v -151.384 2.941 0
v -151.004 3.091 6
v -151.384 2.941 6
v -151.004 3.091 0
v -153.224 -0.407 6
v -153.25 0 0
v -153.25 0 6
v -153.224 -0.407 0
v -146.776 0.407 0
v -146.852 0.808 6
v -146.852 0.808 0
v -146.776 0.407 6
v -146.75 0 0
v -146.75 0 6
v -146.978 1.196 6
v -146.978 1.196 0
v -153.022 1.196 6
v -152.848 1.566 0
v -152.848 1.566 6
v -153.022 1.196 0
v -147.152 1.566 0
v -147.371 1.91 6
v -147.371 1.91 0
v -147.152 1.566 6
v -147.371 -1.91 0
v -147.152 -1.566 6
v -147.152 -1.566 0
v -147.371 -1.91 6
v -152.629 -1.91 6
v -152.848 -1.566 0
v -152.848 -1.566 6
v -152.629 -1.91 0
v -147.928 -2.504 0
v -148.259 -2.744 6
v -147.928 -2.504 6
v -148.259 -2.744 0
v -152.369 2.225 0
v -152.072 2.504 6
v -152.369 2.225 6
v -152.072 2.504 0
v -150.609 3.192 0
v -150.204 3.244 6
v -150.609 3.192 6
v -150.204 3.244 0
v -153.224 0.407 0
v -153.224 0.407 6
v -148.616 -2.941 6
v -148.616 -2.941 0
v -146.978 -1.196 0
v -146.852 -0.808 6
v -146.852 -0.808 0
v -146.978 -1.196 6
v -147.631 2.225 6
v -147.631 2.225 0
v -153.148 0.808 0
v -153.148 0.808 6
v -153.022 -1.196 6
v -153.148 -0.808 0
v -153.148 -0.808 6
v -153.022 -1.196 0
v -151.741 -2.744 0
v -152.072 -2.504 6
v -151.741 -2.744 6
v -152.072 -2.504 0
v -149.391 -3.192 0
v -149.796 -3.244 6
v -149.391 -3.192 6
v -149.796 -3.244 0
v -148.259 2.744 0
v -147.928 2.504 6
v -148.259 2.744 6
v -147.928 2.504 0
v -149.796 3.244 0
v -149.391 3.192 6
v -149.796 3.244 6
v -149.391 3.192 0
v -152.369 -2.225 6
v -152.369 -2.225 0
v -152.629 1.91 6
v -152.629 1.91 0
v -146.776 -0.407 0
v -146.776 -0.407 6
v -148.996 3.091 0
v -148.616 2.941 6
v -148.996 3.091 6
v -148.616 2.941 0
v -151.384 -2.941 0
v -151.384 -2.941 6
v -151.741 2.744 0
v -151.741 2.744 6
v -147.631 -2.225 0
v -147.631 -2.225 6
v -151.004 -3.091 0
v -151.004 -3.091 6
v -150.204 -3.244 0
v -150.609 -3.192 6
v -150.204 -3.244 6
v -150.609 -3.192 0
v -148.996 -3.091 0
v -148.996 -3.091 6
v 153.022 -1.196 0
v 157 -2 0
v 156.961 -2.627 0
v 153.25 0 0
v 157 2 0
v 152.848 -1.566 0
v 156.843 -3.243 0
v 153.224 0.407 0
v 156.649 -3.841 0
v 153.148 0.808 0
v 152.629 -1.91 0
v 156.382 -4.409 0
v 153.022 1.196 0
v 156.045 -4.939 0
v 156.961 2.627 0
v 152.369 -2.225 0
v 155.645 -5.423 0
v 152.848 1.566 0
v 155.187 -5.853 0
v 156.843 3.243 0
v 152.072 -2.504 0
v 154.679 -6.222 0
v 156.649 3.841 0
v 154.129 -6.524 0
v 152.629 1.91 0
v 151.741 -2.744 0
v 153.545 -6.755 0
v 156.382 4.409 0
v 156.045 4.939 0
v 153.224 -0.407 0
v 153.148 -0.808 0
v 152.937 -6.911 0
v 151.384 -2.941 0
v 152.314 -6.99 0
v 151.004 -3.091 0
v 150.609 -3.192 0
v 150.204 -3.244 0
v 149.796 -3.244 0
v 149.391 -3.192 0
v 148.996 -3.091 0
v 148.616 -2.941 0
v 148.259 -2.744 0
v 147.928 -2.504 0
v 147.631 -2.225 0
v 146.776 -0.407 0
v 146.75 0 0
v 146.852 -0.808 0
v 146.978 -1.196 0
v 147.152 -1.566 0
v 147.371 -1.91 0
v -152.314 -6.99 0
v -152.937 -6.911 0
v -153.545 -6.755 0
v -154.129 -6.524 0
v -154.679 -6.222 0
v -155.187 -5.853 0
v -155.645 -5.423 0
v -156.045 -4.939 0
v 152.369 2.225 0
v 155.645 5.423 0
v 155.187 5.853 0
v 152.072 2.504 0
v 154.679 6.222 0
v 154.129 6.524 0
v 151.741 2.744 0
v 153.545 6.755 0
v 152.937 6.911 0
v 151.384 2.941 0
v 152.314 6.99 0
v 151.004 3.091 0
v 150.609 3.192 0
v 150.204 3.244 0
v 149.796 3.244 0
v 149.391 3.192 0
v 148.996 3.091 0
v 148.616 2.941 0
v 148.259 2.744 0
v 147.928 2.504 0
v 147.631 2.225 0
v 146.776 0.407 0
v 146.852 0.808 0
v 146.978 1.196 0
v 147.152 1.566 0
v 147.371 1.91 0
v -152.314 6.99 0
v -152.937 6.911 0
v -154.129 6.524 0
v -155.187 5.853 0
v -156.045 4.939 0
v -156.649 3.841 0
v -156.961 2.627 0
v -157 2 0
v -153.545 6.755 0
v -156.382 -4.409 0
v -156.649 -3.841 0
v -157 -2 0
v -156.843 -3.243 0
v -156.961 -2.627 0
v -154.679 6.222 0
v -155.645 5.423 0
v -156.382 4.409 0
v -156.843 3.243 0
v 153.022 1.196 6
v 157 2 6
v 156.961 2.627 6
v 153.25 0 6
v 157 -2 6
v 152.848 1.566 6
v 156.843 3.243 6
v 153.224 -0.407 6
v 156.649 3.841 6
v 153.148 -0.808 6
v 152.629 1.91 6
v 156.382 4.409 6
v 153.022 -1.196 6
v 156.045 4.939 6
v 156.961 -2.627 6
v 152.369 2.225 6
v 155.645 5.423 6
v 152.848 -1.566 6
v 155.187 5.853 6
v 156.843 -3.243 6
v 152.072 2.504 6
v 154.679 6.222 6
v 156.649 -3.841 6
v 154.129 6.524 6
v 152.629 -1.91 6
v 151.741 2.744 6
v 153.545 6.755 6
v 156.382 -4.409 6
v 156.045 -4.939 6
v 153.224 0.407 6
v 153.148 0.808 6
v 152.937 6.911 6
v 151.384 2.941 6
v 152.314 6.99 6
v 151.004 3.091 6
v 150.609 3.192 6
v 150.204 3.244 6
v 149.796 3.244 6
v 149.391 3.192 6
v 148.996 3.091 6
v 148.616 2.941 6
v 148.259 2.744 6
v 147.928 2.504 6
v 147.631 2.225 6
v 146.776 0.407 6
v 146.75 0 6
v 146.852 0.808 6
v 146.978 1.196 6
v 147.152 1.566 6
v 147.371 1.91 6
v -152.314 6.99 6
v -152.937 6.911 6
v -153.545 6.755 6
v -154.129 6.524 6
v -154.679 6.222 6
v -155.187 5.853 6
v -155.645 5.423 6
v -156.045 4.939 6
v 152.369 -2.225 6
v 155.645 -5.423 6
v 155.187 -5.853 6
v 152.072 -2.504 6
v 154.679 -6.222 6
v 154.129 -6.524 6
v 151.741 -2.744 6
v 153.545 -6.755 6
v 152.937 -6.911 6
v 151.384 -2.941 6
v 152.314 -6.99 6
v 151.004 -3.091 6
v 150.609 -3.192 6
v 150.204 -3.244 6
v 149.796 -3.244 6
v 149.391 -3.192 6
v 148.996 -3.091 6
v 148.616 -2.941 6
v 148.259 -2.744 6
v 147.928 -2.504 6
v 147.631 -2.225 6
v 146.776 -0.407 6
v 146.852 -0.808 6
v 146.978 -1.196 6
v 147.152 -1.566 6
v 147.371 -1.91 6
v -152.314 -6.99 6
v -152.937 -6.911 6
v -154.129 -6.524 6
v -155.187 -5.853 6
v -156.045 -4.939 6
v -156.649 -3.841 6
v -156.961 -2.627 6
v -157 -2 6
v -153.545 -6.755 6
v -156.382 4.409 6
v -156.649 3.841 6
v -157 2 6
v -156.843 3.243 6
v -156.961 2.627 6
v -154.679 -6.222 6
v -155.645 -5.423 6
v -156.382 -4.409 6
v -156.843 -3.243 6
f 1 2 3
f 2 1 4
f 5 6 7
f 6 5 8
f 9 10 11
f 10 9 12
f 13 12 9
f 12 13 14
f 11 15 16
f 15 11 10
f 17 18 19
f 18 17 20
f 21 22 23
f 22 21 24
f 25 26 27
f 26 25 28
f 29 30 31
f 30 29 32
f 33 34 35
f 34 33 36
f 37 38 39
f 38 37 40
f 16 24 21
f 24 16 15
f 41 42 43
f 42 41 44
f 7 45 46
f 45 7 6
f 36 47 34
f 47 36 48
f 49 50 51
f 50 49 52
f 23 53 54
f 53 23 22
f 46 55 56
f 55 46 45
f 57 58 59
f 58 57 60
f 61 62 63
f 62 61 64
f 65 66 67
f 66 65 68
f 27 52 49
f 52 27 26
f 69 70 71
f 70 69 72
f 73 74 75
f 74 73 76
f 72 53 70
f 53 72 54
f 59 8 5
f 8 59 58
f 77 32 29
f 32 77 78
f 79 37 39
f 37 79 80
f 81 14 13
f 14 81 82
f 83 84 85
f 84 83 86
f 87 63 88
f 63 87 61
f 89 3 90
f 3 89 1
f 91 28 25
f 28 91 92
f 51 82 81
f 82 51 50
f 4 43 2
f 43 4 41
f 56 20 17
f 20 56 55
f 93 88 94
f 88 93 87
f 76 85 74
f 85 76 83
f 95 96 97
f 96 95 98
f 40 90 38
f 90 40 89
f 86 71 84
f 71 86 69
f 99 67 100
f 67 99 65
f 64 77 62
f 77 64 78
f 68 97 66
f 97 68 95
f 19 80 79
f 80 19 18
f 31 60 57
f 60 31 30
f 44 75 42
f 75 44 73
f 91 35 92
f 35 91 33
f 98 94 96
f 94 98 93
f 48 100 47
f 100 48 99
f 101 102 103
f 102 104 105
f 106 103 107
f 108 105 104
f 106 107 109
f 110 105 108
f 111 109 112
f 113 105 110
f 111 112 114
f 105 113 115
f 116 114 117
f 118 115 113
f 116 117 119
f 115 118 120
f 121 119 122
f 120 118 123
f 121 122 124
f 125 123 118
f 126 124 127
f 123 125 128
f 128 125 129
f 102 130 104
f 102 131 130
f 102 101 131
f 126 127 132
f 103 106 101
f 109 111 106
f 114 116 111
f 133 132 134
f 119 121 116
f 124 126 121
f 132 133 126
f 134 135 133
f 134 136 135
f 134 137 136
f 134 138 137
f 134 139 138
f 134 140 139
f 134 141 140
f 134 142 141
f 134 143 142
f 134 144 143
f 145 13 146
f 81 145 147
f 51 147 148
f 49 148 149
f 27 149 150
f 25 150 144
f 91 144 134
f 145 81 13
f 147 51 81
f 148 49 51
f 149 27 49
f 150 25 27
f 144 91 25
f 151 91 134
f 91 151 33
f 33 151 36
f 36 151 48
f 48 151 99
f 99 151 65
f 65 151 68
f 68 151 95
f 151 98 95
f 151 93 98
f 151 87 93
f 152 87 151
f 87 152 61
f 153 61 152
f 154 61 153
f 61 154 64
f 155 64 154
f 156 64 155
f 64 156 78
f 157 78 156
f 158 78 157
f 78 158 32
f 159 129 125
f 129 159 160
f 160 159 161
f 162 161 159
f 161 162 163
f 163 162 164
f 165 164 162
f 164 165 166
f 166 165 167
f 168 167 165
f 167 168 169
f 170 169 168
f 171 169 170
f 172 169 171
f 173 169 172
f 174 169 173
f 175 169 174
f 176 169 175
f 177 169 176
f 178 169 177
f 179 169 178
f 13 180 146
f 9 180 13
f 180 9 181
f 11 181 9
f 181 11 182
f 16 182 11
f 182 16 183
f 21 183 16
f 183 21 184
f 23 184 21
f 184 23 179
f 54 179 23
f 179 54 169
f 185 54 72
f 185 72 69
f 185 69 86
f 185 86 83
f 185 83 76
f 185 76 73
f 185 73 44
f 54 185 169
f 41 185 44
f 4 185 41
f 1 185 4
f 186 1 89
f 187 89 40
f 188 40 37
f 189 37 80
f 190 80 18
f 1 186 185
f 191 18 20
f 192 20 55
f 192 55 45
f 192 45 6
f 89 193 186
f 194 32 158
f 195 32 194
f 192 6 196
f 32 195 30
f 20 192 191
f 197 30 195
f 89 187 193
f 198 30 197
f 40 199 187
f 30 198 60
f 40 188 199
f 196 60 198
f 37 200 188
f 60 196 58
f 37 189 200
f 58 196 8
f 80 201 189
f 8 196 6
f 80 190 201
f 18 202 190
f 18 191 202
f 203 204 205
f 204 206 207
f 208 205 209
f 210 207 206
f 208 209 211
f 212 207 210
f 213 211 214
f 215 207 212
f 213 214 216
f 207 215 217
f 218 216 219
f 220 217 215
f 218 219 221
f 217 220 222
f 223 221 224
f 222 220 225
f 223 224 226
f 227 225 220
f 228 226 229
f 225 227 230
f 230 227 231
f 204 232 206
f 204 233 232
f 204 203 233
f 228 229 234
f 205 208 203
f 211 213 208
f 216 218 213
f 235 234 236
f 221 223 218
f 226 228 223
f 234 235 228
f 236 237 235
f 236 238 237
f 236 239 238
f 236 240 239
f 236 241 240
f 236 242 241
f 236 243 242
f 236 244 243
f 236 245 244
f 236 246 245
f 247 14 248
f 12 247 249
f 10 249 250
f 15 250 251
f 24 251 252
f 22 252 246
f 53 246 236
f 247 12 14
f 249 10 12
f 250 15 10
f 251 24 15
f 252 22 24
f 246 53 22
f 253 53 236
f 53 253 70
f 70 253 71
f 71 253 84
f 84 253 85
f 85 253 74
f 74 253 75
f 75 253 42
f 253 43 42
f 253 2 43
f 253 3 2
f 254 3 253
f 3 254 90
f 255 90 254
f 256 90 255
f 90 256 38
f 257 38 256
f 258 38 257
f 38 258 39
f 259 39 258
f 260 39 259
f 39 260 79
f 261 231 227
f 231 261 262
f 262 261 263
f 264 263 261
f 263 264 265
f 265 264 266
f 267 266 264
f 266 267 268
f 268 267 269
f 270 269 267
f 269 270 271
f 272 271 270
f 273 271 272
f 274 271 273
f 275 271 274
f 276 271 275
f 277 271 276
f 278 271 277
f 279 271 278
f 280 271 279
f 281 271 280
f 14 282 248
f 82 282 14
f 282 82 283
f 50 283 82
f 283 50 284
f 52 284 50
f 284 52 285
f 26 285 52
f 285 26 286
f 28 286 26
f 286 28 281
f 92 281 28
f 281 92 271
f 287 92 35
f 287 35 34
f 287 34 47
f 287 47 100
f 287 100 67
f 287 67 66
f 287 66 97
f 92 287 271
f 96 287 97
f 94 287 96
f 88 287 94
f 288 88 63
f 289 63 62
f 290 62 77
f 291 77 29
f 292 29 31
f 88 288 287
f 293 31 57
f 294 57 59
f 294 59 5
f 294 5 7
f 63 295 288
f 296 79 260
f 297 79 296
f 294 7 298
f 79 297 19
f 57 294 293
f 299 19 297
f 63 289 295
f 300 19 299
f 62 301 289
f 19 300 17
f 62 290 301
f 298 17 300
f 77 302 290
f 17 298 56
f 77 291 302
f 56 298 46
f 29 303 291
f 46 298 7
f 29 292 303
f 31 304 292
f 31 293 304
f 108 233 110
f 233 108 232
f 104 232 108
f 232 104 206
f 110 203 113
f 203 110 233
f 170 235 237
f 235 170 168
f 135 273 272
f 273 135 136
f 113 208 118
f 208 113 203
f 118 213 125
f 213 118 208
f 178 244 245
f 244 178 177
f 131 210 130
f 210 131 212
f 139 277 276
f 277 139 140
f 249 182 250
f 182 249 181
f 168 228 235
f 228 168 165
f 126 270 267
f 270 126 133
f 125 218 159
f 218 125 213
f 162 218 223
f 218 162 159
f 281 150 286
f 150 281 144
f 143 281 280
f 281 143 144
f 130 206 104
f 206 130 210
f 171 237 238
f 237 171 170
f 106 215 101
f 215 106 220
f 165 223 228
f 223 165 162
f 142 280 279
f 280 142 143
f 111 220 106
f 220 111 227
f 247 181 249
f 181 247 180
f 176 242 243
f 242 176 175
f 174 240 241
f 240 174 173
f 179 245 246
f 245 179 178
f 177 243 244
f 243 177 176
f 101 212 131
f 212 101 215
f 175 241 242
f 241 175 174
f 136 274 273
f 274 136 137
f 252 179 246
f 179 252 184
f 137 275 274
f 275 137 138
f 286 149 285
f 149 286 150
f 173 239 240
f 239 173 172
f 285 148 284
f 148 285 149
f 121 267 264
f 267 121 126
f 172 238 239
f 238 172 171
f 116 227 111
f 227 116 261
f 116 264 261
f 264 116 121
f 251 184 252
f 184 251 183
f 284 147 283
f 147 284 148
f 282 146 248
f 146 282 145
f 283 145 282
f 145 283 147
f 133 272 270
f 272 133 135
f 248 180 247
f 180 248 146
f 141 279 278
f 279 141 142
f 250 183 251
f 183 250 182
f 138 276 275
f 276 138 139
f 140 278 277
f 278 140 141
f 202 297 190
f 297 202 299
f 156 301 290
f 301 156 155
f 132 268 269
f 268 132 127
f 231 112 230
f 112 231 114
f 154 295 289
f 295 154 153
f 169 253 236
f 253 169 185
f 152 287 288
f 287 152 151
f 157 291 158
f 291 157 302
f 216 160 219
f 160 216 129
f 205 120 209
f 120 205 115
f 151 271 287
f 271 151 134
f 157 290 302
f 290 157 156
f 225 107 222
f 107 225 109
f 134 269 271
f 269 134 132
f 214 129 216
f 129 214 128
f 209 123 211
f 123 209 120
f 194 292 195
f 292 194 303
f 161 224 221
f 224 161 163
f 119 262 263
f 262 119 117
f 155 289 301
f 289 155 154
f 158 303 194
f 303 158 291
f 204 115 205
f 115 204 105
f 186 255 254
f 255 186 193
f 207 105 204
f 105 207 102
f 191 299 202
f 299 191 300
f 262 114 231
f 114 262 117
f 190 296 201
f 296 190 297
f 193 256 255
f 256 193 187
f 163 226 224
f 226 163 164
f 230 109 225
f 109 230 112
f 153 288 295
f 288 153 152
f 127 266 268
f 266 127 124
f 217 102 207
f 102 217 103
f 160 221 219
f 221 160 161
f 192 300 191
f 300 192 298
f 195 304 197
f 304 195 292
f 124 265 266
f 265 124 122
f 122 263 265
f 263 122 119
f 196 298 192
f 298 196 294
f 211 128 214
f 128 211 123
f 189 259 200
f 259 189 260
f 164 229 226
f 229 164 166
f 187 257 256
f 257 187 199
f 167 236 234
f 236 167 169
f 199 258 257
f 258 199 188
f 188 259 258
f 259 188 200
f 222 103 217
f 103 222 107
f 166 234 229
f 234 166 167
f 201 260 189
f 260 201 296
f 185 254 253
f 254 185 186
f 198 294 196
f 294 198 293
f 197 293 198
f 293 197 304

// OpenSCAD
$fn = 50;


difference() {
	union() {
		hull() {
			translate(v = [-152.0000000000, 2.0000000000, 0]) {
				cylinder(h = 6, r = 5);
			}
			translate(v = [152.0000000000, 2.0000000000, 0]) {
				cylinder(h = 6, r = 5);
			}
			translate(v = [-152.0000000000, -2.0000000000, 0]) {
				cylinder(h = 6, r = 5);
			}
			translate(v = [152.0000000000, -2.0000000000, 0]) {
				cylinder(h = 6, r = 5);
			}
		}
	}
	union() {
		translate(v = [-150.0000000000, 0.0000000000, 0]) {
			cylinder(h = 6, r = 3.2500000000);
		}
		translate(v = [150.0000000000, 0.0000000000, 0]) {
			cylinder(h = 6, r = 3.2500000000);
		}
		translate(v = [-150.0000000000, 0.0000000000, 0]) {
			cylinder(h = 6, r = 1.8000000000);
		}
		translate(v = [150.0000000000, 0.0000000000, 0]) {
			cylinder(h = 6, r = 1.8000000000);
		}
		translate(v = [-150.0000000000, 0.0000000000, 0]) {
			cylinder(h = 6, r = 1.8000000000);
		}
		translate(v = [150.0000000000, 0.0000000000, 0]) {
			cylinder(h = 6, r = 1.8000000000);
		}
		translate(v = [-150.0000000000, 0.0000000000, 0]) {
			cylinder(h = 6, r = 1.8000000000);
		}
		translate(v = [150.0000000000, 0.0000000000, 0]) {
			cylinder(h = 6, r = 1.8000000000);
		}
	}
}
